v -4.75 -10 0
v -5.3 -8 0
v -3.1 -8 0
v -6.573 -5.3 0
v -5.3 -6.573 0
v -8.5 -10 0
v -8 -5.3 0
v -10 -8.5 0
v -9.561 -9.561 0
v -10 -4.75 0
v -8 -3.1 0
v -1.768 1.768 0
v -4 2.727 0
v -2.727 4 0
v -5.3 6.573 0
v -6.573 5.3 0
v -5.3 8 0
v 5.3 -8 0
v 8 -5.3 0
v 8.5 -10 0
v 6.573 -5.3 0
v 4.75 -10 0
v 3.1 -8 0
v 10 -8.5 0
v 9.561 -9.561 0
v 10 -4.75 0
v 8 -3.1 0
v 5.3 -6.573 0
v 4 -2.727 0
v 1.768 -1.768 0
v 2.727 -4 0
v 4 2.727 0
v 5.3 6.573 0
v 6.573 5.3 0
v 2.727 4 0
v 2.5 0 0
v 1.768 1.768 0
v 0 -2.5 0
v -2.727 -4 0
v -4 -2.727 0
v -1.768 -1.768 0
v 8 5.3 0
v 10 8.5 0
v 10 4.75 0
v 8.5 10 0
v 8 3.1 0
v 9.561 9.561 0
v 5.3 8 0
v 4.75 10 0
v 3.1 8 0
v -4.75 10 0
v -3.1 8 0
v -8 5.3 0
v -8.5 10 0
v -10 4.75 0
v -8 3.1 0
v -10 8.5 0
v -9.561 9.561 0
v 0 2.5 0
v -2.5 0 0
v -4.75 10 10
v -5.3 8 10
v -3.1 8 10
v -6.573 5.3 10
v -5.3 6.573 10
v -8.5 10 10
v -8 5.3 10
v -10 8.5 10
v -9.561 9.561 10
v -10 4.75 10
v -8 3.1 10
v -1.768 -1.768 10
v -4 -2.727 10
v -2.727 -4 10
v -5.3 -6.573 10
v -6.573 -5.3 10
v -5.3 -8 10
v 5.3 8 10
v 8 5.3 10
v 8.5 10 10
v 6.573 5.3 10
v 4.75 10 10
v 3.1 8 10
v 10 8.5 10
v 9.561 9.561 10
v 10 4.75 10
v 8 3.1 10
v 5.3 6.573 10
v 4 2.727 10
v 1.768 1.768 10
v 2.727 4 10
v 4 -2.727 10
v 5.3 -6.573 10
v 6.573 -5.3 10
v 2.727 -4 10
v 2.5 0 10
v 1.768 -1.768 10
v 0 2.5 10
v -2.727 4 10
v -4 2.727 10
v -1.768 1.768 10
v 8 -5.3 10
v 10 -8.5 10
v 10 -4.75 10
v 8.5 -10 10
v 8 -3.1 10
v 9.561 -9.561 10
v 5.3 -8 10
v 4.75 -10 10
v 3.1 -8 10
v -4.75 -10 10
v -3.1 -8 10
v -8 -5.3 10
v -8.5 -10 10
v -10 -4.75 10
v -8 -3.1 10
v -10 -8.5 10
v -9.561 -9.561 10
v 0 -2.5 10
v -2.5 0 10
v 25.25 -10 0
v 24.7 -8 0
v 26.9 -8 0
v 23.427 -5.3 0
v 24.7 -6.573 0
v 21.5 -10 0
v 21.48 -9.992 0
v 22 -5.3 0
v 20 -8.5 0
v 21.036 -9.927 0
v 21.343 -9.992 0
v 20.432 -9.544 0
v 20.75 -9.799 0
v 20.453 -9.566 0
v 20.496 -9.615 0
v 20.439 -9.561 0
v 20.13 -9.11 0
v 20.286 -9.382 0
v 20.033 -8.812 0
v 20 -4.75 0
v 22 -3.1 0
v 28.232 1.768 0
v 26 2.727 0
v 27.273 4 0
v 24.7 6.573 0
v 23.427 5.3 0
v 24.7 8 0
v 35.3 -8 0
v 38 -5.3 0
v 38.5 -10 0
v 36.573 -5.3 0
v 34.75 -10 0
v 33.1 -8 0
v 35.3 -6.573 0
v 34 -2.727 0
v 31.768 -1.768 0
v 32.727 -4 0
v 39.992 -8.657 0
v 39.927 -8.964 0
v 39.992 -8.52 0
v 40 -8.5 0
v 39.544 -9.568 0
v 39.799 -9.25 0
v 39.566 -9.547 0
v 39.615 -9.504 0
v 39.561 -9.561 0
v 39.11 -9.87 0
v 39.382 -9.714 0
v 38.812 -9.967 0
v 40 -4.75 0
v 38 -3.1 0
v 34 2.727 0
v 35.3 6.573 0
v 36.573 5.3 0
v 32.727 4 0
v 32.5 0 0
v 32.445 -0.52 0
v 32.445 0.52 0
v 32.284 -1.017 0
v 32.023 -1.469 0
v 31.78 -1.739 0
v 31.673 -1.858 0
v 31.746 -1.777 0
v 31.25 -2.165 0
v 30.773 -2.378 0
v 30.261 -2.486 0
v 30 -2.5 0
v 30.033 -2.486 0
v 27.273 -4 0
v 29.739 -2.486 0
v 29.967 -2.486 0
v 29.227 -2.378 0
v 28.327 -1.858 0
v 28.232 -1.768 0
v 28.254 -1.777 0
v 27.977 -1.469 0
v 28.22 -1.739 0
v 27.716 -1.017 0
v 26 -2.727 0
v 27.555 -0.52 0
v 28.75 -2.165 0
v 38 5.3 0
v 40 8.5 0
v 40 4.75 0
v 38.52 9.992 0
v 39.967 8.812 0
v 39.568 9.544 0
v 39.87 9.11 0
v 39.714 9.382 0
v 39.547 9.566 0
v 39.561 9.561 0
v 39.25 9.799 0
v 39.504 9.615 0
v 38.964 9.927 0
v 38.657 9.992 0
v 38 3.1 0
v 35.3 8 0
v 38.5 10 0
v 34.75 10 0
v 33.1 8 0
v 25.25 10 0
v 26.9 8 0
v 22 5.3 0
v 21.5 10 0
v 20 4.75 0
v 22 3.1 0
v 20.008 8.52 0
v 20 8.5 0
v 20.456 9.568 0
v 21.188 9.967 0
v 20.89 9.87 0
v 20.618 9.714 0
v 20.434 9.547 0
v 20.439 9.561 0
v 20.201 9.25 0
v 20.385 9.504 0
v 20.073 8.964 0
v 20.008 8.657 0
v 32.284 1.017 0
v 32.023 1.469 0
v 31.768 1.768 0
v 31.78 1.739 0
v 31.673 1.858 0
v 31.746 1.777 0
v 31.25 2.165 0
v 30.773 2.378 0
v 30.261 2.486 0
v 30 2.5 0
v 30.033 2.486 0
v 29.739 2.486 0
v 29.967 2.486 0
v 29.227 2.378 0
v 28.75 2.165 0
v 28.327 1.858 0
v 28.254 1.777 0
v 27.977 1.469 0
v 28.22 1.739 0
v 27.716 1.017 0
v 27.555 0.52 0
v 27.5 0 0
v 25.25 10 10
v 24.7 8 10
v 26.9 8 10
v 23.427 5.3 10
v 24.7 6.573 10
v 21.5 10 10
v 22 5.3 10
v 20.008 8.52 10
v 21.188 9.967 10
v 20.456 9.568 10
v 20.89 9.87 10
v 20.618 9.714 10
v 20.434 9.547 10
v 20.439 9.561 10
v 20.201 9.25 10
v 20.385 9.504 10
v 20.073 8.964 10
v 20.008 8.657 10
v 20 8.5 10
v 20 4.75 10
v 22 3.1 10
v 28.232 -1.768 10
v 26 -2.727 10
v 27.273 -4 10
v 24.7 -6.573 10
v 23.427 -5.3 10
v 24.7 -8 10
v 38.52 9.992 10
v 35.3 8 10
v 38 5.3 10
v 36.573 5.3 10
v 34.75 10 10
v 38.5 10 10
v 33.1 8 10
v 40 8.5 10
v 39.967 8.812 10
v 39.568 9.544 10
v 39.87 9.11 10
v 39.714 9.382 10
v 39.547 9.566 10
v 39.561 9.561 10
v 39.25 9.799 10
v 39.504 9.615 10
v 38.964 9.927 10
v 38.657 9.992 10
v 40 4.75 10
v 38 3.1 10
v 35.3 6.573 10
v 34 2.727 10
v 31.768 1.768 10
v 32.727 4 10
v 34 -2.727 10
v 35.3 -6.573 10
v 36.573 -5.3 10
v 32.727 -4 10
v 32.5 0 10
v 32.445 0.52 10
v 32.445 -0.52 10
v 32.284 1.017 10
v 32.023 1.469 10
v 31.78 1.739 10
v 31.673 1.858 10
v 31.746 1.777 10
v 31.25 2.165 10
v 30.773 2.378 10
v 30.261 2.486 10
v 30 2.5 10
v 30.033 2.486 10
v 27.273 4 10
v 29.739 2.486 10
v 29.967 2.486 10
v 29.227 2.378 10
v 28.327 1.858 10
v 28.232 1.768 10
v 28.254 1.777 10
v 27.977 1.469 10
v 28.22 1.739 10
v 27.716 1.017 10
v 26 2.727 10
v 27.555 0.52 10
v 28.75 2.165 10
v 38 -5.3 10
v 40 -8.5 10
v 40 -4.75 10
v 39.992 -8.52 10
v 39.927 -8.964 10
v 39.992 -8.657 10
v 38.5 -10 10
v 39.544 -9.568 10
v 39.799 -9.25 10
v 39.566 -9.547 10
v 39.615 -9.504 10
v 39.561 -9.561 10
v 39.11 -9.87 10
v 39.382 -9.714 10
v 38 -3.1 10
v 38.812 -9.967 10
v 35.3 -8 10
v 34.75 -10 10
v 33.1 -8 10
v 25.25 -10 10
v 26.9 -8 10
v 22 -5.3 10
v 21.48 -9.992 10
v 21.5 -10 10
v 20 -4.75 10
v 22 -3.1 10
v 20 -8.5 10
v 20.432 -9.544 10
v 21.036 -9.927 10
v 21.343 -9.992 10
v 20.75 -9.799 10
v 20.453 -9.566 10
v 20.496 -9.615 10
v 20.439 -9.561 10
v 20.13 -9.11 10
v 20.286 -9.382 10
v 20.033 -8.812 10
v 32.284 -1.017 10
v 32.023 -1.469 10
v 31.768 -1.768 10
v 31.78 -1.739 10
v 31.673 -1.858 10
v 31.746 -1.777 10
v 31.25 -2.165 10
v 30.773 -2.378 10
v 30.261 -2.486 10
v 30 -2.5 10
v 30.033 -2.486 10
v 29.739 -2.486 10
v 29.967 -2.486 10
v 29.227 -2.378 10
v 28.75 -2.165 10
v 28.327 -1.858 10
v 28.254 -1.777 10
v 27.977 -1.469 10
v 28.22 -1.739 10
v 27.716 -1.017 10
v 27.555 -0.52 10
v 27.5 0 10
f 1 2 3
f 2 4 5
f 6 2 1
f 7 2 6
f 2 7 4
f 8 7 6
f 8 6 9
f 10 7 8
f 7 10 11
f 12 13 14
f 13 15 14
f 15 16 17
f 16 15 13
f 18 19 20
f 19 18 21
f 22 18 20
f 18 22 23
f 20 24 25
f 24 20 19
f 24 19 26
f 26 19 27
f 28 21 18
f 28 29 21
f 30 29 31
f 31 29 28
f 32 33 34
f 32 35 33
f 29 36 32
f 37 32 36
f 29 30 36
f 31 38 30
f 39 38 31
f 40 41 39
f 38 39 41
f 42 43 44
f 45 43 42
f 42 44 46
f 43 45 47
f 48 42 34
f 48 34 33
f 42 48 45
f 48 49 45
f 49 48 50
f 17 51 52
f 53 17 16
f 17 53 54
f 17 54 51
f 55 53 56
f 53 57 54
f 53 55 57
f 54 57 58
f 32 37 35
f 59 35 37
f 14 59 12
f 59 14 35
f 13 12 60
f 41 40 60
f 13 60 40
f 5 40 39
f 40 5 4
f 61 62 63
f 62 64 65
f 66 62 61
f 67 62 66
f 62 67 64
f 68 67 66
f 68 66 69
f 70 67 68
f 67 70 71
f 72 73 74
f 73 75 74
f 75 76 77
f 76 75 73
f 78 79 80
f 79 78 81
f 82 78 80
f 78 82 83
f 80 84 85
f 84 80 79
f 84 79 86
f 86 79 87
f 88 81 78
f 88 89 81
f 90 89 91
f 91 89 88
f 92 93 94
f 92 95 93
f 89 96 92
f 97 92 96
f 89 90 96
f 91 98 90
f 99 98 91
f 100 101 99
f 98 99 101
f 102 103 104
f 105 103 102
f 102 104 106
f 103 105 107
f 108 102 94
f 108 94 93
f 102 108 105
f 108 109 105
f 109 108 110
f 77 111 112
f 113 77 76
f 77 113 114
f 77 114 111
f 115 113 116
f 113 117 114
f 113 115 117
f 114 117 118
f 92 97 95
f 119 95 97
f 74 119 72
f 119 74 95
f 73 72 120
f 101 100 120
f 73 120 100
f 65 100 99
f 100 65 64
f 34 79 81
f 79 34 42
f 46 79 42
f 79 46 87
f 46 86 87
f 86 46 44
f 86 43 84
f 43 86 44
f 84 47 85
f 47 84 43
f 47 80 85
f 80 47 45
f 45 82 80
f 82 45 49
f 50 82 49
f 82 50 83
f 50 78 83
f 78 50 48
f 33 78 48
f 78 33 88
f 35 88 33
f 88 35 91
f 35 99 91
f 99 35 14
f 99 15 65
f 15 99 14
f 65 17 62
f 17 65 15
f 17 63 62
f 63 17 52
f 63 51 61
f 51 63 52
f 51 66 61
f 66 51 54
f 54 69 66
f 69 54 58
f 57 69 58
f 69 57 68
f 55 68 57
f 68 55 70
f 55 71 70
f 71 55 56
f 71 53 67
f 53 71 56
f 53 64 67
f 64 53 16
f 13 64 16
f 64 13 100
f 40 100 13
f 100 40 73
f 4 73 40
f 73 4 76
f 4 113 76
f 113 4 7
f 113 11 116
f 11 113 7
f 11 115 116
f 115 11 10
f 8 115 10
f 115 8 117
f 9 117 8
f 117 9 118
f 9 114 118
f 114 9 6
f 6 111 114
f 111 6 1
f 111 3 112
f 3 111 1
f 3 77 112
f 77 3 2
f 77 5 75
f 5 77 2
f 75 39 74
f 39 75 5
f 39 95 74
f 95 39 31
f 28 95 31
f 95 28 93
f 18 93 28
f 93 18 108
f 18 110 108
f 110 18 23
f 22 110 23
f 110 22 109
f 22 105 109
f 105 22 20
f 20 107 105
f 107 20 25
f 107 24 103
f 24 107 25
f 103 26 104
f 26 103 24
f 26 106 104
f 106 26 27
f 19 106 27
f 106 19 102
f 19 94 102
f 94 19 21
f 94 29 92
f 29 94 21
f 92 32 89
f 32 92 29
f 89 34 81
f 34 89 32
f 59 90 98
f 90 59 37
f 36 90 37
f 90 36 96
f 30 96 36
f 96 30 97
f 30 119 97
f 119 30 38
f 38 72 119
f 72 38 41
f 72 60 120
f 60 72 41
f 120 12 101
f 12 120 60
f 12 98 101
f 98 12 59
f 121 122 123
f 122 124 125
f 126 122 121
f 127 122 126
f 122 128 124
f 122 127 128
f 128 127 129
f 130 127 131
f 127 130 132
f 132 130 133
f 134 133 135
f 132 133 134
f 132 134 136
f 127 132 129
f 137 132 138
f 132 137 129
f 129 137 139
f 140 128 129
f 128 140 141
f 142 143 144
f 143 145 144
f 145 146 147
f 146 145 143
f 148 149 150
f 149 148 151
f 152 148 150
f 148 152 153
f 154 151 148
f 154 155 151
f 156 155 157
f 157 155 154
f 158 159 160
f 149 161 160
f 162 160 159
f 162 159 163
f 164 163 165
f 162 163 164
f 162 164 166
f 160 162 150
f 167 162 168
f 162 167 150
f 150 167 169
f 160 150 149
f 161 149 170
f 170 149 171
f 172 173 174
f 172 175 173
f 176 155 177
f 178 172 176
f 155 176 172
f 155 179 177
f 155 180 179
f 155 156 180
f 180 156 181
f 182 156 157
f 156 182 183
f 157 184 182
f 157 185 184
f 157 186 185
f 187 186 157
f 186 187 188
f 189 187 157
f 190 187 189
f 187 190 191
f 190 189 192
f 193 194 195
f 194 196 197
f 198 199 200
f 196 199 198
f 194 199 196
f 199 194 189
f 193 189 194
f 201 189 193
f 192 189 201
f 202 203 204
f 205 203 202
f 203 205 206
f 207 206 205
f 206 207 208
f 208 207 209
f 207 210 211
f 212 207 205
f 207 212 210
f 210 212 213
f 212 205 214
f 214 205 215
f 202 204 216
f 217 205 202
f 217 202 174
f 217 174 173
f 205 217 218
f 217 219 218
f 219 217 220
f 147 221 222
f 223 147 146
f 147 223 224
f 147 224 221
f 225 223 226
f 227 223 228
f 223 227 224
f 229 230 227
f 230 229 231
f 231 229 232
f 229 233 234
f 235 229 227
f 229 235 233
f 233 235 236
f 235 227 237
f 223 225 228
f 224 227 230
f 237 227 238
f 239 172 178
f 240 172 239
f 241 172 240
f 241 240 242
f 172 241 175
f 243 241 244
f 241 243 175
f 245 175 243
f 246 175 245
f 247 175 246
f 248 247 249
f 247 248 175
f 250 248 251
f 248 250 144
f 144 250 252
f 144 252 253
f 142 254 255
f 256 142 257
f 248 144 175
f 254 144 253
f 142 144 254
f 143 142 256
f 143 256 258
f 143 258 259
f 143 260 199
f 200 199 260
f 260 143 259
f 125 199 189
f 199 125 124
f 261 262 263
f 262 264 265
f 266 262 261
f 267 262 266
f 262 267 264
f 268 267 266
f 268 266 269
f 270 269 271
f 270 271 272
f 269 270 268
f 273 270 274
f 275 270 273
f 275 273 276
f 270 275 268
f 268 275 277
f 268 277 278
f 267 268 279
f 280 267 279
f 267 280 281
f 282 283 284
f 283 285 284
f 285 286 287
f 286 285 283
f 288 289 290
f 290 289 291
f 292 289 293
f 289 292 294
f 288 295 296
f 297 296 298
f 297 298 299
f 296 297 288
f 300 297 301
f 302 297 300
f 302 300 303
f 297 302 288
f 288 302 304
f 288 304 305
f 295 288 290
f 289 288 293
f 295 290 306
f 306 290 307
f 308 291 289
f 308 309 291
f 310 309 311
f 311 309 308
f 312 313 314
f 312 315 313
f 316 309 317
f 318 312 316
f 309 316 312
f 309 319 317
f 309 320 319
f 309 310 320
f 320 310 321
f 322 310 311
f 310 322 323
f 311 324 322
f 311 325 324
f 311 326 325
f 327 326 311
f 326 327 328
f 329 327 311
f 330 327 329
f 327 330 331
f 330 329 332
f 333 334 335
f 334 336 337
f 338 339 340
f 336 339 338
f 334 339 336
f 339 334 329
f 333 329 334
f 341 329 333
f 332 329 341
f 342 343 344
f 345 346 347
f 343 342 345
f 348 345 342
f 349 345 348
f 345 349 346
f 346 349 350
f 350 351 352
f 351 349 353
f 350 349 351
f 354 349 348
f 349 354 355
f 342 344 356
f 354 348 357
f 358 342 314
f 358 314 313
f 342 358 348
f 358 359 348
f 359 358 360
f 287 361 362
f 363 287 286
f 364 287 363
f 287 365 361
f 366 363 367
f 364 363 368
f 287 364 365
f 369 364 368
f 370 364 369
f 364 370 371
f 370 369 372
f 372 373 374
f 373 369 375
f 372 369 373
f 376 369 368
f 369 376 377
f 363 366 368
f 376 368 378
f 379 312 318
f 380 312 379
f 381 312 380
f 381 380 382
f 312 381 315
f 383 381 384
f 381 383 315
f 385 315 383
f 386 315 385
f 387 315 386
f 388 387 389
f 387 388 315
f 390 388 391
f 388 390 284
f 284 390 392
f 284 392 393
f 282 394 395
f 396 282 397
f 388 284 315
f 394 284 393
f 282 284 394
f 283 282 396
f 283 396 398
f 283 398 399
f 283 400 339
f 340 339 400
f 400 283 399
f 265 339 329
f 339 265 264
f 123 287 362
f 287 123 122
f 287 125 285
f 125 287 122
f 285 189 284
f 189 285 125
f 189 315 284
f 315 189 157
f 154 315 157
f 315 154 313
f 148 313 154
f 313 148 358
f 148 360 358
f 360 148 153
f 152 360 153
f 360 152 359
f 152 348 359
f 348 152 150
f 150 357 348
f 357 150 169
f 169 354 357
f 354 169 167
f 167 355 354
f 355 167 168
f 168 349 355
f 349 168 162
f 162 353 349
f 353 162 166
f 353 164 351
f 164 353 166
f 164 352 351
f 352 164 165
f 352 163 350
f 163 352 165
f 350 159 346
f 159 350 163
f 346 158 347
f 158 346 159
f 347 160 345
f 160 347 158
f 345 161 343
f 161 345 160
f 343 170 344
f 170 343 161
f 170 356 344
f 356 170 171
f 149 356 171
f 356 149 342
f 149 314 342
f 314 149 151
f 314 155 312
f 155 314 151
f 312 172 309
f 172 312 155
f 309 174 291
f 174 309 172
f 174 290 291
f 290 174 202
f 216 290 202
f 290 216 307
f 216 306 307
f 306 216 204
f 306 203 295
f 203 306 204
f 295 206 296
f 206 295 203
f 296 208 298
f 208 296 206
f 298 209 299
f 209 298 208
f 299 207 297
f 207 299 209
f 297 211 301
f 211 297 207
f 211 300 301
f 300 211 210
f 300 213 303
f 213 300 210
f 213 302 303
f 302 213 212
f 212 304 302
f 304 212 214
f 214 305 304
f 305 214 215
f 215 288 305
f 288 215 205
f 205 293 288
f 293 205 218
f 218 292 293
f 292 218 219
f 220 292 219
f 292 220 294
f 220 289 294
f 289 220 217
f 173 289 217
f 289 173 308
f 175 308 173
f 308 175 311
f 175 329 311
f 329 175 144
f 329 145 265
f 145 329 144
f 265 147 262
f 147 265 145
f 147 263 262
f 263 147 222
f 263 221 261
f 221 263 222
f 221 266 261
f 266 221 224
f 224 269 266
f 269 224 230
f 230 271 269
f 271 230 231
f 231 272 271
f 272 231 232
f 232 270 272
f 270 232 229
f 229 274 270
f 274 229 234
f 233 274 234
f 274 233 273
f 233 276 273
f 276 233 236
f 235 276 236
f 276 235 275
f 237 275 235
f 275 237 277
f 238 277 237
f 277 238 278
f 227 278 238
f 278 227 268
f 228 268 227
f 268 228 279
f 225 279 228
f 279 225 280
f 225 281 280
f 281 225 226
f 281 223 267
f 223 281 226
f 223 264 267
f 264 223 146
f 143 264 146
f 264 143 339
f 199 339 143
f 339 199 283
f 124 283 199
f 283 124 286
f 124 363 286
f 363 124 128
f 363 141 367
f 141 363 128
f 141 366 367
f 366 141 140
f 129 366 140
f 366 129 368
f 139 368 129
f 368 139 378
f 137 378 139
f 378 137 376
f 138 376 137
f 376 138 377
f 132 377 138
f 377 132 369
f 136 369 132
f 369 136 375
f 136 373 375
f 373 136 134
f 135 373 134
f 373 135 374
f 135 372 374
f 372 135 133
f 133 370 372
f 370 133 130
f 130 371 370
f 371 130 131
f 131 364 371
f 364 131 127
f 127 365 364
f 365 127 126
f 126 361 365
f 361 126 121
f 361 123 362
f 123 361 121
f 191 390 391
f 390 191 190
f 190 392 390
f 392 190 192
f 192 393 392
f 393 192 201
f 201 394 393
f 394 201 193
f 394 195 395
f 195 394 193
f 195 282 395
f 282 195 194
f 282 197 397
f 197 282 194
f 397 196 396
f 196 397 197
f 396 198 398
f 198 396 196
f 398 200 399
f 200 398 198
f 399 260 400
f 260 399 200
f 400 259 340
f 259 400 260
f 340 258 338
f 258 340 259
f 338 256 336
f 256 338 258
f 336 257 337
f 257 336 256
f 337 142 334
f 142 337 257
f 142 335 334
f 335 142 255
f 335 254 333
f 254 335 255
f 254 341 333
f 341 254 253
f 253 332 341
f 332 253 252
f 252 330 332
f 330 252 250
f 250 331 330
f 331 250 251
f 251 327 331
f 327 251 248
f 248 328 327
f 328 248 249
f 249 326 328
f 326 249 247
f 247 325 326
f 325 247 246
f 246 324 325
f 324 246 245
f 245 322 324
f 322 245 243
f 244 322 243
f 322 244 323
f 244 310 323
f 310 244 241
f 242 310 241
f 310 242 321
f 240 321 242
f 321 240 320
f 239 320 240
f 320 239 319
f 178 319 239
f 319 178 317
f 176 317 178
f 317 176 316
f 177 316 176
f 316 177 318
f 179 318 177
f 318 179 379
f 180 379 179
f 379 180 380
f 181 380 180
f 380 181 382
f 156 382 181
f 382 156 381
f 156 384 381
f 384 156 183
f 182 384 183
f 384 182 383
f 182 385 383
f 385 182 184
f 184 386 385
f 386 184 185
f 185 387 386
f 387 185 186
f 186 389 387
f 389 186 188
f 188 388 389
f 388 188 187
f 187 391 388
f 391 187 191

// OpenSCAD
// Aleksandr Saechnikov 17 june 2015

extrusion_profile_20x20_v_slot(size = 20, height = 10);
translate([30, 0, 0]) extrusion_profile_20x20_v_slot_smooth(size = 20, height = 10);

$fn = 30;

module extrusion_profile_20x20_v_slot(size = 20, height = 10) {
	echo("BOM: 2020 profile ", height);
	color([0.7, 0.7, 0.7]) linear_extrude(height = height) {
		union() {
			extrusion_profile_20x20_v_slot_part(size);
			rotate([0, 0, 90]) extrusion_profile_20x20_v_slot_part(size);
			rotate([0, 0, 180]) extrusion_profile_20x20_v_slot_part(size);
			rotate([0, 0, 270]) extrusion_profile_20x20_v_slot_part(size);
		}
	}
}

module extrusion_profile_20x20_v_slot_part(size = 20) {
	d = 5;
	r = 1.5;
	s1 = 1.8;
	s2 = 2;
	s3 = 6;
	s4 = 6.2;
	s5 = 9.5;
	s6 = 10.6;
	s7 = 20;

	reSize = size / 20; // Scalling

	k0 = 0;
	k1 = d * 0.5 * cos(45) * reSize;
	k2 = d * 0.5 * reSize;
	k3 = ((s7 * 0.5 - s3) - s1 * 0.5 * sqrt(2)) * reSize;
	k4 = s4 * 0.5 * reSize;
	k5 = (s7 * 0.5 - s3) * reSize;
	k6 = s6 * 0.5 * reSize;
	k7 = (s6 * 0.5 + s1 * 0.5 * sqrt(2)) * reSize;
	k8 = (s7 * 0.5 - s2) * reSize;
	k9 = s5 * 0.5 * reSize;
	k10 = s7 * 0.5 * reSize;
	k10_1 = k10 - r * (1 - cos(45)) * reSize;
	k10_2 = k10 - r * reSize;

	polygon(points = [
		[k1, k1],
		[k0, k2],
		[k0, k5],
		[k3, k5],
		[k6, k7],
		[k6, k8],
		[k4, k8],
		[k9, k10],
		[k10_2, k10],
		[k10_1, k10_1],
		[k10, k10_2],
		[k10, k9],
		[k8, k4],
		[k8, k6],
		[k7, k6],
		[k5, k3],
		[k5, k0],
		[k2, k0]
	]);
}

module extrusion_profile_20x20_v_slot_smooth(size = 20, height = 10) {
	linear_extrude(height = height) {
		difference() {
			union() {
				extrusion_profile_20x20_v_slot_part_smooth(size);
				rotate([0, 0, 90]) extrusion_profile_20x20_v_slot_part_smooth(size);
				rotate([0, 0, 180]) extrusion_profile_20x20_v_slot_part_smooth(size);
				rotate([0, 0, 270]) extrusion_profile_20x20_v_slot_part_smooth(size);
			}
			circle([0, 0], r = size / 20. * 2.5);
		}
	}
}

module extrusion_profile_20x20_v_slot_part_smooth(size = 20) {
	r_center = 0.5 * size - 1.5 * size / 20;
	union() {
		translate([r_center, r_center]) circle(r = 1.5 * size / 20);
		extrusion_profile_20x20_v_slot_part(size);
	}
}
